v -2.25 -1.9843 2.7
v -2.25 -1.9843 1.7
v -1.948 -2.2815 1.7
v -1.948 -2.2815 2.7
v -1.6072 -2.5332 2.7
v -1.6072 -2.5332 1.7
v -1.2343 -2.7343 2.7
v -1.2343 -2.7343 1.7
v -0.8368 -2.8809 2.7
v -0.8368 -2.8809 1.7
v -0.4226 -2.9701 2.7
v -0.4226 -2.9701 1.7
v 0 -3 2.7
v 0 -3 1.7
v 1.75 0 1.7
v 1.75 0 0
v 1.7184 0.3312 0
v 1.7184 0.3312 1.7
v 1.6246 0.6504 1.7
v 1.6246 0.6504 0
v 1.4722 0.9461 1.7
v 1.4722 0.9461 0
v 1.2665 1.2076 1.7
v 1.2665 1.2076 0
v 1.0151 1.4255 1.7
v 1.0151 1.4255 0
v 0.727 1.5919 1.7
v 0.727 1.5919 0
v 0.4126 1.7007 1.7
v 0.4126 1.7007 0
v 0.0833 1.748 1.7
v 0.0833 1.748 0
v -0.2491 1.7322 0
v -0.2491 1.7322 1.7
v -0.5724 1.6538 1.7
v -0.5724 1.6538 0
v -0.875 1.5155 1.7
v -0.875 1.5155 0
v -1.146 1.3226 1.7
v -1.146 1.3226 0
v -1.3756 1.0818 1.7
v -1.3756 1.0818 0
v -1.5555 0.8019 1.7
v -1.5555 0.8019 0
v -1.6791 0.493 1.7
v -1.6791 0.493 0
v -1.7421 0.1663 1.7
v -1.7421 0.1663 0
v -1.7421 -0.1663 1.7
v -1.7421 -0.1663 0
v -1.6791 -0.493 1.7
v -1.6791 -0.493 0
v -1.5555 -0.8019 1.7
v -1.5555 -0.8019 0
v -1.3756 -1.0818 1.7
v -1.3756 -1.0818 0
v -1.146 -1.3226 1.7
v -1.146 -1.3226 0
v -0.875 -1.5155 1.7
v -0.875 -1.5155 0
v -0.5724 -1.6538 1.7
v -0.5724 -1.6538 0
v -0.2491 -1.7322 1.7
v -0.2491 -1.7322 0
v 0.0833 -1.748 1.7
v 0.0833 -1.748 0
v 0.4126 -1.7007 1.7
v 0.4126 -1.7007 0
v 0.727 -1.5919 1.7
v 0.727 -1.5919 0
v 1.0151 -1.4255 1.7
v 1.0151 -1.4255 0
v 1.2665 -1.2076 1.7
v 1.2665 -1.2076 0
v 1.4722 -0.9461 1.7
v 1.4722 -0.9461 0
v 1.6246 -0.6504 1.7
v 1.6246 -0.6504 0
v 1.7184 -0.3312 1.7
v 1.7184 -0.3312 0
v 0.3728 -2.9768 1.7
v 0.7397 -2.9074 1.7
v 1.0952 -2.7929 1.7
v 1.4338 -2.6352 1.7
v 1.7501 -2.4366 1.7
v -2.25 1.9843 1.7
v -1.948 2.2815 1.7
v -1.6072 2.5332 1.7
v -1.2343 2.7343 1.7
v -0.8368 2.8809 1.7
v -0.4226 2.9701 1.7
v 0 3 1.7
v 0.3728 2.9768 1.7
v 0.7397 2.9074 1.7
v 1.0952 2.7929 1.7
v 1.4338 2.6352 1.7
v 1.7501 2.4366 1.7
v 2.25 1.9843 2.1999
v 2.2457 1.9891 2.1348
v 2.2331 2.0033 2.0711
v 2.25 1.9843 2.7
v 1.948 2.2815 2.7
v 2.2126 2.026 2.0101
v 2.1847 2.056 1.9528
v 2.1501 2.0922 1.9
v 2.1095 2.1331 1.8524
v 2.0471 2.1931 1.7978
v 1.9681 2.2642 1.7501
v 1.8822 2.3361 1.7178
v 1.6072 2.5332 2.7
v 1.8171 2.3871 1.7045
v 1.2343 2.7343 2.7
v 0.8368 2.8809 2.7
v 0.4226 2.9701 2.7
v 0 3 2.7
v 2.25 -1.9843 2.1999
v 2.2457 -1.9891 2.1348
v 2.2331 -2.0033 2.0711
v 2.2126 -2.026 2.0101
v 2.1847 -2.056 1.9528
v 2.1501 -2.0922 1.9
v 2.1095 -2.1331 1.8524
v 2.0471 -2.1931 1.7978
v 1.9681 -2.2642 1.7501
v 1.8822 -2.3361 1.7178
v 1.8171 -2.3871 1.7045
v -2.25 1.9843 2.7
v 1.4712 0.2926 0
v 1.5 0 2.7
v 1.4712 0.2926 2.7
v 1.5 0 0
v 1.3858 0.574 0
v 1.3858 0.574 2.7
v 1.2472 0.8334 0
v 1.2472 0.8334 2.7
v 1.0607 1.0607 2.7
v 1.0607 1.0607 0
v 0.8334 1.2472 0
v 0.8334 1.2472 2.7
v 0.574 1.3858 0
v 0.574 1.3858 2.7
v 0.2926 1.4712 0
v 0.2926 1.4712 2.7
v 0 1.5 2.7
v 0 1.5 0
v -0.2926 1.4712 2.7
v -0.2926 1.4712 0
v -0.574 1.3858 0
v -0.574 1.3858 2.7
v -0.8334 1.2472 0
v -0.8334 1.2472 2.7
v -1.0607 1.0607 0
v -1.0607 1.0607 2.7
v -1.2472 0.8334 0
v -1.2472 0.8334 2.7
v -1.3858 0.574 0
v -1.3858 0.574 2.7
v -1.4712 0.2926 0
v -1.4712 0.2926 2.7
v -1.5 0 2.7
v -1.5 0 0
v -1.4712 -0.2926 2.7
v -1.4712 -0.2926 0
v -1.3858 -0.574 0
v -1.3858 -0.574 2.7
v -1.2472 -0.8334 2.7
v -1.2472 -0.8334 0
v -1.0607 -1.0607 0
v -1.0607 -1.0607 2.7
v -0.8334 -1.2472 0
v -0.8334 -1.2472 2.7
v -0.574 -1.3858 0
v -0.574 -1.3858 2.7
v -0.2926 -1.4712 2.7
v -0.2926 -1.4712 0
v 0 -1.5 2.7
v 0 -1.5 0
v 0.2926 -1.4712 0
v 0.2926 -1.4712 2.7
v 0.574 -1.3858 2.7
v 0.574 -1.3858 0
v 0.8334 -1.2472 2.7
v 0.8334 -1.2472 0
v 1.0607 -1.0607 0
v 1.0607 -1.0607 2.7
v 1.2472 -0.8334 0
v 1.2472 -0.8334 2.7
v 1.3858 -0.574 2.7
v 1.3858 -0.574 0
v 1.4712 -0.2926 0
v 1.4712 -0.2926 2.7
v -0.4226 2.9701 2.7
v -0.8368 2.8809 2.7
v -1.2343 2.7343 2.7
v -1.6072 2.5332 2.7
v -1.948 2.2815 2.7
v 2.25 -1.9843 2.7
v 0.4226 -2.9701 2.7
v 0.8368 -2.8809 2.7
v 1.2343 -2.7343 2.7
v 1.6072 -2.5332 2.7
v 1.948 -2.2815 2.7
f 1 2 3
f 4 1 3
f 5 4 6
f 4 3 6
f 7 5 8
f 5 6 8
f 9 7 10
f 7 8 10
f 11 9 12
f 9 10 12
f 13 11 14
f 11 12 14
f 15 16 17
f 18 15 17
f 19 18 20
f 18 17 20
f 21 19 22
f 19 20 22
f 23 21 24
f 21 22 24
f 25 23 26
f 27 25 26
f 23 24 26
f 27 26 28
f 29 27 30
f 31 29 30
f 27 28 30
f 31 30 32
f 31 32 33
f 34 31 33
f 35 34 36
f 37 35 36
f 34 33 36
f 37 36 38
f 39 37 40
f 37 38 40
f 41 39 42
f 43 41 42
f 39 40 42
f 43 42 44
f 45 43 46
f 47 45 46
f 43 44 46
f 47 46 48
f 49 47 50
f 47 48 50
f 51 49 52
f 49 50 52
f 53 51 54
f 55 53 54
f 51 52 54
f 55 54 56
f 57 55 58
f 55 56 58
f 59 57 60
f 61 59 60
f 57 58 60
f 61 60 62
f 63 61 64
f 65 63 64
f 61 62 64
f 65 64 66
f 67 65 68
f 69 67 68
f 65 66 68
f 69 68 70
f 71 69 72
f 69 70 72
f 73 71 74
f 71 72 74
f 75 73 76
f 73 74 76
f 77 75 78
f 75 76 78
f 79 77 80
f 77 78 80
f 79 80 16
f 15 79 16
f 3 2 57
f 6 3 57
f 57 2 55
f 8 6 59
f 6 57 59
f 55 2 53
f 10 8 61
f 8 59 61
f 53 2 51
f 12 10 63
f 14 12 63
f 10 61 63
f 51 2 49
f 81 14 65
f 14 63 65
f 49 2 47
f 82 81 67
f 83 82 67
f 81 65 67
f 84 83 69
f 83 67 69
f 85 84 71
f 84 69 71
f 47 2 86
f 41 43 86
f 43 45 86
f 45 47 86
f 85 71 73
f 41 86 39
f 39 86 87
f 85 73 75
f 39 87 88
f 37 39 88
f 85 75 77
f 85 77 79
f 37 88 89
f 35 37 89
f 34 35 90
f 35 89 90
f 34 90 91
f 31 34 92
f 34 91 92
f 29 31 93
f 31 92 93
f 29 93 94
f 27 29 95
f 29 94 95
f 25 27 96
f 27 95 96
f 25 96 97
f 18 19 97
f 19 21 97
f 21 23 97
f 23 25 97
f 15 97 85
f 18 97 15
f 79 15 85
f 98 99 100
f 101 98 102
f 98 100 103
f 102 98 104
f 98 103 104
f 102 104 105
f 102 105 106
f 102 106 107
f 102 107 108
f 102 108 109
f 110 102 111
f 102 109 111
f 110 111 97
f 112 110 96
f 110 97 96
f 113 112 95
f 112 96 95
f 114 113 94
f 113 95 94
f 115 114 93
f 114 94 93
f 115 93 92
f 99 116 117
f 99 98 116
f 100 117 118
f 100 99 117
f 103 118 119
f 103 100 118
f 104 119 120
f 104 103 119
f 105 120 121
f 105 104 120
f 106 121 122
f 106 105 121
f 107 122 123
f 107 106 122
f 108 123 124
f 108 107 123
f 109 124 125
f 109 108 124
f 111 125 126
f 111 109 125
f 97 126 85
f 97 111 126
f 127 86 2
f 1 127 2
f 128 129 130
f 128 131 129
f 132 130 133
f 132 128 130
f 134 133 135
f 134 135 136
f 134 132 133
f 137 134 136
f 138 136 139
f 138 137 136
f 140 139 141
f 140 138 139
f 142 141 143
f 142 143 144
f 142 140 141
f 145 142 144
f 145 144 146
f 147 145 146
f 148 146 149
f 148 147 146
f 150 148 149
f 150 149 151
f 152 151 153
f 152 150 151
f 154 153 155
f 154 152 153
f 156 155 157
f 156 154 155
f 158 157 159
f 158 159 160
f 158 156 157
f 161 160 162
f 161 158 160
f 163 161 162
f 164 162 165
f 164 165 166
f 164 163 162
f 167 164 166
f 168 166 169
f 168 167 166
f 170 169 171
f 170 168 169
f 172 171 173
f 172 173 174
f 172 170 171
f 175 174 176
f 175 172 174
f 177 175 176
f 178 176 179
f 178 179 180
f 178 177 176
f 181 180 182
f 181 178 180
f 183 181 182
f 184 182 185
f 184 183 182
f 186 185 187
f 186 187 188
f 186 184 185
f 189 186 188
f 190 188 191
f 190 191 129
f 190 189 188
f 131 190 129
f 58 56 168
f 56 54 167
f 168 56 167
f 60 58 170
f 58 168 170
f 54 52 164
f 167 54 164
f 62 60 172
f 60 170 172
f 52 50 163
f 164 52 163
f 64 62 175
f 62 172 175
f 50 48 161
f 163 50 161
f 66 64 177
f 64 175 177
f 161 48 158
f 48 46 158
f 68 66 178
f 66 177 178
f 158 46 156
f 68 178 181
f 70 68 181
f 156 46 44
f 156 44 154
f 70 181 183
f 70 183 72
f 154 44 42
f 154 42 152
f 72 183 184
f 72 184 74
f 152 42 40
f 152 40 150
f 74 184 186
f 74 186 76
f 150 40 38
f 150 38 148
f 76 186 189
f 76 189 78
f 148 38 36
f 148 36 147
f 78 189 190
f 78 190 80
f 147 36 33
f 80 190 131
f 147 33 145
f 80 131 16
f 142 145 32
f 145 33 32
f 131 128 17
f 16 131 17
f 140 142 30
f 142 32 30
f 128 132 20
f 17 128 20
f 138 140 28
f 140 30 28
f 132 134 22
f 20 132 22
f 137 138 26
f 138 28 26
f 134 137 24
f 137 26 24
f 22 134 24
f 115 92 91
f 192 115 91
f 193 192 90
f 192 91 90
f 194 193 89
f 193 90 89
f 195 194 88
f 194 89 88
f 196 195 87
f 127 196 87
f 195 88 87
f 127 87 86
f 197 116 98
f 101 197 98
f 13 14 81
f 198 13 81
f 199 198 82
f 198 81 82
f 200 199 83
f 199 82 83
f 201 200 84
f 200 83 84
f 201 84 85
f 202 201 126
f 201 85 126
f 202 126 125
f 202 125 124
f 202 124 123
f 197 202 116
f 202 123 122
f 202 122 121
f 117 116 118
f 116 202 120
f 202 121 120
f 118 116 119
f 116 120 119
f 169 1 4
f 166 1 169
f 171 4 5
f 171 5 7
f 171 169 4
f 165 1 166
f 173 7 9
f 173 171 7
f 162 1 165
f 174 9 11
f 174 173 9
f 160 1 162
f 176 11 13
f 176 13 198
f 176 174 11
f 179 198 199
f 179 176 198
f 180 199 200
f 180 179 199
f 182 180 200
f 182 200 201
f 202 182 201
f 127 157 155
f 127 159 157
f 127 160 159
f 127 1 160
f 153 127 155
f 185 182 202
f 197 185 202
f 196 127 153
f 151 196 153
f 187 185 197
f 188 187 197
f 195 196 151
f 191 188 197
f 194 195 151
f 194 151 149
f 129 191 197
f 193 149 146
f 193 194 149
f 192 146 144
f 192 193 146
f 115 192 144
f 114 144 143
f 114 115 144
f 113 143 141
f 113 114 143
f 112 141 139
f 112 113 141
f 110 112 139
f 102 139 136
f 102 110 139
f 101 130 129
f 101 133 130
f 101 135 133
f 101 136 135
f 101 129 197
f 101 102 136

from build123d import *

# Parameters (mm, degrees)
SKETCH_1_R      = 1.75
SKETCH_1_R_2    = 1.5
EXTRUDE_1_DEPTH = 1.7
SKETCH_2_R      = 1.75
SKETCH_2_R_2    = 1.5
EXTRUDE_2_DEPTH = 1
FILLET_1_R      = 0.5


with BuildPart() as part:
    # 草图1 → 凸台-拉伸1 (new body)
    with BuildSketch(Plane.XY):
        Circle(SKETCH_1_R)
        Circle(SKETCH_1_R_2, mode=Mode.SUBTRACT)
    extrude(amount=EXTRUDE_1_DEPTH)

    # 草图2 → 凸台-拉伸2 (add)
    # profile 1 of 2: a face of its own
    with BuildSketch(Plane.XY.offset(1.7)):
        with BuildLine():
            ThreePointArc((-2.25, -1.984313483), (-1.234313483, -2.734313483), (0, -3))
            ThreePointArc((0, -3), (1.234313483, -2.734313483), (2.25, -1.984313483))
            Line((2.25, -1.984313483), (2.25, 1.984313483))
            ThreePointArc((2.25, 1.984313483), (1.234313483, 2.734313483), (0, 3))
            ThreePointArc((0, 3), (-1.234313483, 2.734313483), (-2.25, 1.984313483))
            Line((-2.25, 1.984313483), (-2.25, -1.984313483))
        make_face()
        Circle(SKETCH_2_R, mode=Mode.SUBTRACT)
    # profile 2 of 2: a face of its own
    with BuildSketch(Plane.XY.offset(1.7)):
        Circle(SKETCH_2_R)
        Circle(SKETCH_2_R_2, mode=Mode.SUBTRACT)
    extrude(amount=EXTRUDE_2_DEPTH)

    # 圆角1
    fillet_1_edges = [part.edges().sort_by_distance(p)[0] for p in [
        (2.25, 0, 1.7),
    ]]
    fillet(fillet_1_edges, radius=FILLET_1_R - 0.0001)  # a hair under: the kernel refuses the full size


solid = part.part
